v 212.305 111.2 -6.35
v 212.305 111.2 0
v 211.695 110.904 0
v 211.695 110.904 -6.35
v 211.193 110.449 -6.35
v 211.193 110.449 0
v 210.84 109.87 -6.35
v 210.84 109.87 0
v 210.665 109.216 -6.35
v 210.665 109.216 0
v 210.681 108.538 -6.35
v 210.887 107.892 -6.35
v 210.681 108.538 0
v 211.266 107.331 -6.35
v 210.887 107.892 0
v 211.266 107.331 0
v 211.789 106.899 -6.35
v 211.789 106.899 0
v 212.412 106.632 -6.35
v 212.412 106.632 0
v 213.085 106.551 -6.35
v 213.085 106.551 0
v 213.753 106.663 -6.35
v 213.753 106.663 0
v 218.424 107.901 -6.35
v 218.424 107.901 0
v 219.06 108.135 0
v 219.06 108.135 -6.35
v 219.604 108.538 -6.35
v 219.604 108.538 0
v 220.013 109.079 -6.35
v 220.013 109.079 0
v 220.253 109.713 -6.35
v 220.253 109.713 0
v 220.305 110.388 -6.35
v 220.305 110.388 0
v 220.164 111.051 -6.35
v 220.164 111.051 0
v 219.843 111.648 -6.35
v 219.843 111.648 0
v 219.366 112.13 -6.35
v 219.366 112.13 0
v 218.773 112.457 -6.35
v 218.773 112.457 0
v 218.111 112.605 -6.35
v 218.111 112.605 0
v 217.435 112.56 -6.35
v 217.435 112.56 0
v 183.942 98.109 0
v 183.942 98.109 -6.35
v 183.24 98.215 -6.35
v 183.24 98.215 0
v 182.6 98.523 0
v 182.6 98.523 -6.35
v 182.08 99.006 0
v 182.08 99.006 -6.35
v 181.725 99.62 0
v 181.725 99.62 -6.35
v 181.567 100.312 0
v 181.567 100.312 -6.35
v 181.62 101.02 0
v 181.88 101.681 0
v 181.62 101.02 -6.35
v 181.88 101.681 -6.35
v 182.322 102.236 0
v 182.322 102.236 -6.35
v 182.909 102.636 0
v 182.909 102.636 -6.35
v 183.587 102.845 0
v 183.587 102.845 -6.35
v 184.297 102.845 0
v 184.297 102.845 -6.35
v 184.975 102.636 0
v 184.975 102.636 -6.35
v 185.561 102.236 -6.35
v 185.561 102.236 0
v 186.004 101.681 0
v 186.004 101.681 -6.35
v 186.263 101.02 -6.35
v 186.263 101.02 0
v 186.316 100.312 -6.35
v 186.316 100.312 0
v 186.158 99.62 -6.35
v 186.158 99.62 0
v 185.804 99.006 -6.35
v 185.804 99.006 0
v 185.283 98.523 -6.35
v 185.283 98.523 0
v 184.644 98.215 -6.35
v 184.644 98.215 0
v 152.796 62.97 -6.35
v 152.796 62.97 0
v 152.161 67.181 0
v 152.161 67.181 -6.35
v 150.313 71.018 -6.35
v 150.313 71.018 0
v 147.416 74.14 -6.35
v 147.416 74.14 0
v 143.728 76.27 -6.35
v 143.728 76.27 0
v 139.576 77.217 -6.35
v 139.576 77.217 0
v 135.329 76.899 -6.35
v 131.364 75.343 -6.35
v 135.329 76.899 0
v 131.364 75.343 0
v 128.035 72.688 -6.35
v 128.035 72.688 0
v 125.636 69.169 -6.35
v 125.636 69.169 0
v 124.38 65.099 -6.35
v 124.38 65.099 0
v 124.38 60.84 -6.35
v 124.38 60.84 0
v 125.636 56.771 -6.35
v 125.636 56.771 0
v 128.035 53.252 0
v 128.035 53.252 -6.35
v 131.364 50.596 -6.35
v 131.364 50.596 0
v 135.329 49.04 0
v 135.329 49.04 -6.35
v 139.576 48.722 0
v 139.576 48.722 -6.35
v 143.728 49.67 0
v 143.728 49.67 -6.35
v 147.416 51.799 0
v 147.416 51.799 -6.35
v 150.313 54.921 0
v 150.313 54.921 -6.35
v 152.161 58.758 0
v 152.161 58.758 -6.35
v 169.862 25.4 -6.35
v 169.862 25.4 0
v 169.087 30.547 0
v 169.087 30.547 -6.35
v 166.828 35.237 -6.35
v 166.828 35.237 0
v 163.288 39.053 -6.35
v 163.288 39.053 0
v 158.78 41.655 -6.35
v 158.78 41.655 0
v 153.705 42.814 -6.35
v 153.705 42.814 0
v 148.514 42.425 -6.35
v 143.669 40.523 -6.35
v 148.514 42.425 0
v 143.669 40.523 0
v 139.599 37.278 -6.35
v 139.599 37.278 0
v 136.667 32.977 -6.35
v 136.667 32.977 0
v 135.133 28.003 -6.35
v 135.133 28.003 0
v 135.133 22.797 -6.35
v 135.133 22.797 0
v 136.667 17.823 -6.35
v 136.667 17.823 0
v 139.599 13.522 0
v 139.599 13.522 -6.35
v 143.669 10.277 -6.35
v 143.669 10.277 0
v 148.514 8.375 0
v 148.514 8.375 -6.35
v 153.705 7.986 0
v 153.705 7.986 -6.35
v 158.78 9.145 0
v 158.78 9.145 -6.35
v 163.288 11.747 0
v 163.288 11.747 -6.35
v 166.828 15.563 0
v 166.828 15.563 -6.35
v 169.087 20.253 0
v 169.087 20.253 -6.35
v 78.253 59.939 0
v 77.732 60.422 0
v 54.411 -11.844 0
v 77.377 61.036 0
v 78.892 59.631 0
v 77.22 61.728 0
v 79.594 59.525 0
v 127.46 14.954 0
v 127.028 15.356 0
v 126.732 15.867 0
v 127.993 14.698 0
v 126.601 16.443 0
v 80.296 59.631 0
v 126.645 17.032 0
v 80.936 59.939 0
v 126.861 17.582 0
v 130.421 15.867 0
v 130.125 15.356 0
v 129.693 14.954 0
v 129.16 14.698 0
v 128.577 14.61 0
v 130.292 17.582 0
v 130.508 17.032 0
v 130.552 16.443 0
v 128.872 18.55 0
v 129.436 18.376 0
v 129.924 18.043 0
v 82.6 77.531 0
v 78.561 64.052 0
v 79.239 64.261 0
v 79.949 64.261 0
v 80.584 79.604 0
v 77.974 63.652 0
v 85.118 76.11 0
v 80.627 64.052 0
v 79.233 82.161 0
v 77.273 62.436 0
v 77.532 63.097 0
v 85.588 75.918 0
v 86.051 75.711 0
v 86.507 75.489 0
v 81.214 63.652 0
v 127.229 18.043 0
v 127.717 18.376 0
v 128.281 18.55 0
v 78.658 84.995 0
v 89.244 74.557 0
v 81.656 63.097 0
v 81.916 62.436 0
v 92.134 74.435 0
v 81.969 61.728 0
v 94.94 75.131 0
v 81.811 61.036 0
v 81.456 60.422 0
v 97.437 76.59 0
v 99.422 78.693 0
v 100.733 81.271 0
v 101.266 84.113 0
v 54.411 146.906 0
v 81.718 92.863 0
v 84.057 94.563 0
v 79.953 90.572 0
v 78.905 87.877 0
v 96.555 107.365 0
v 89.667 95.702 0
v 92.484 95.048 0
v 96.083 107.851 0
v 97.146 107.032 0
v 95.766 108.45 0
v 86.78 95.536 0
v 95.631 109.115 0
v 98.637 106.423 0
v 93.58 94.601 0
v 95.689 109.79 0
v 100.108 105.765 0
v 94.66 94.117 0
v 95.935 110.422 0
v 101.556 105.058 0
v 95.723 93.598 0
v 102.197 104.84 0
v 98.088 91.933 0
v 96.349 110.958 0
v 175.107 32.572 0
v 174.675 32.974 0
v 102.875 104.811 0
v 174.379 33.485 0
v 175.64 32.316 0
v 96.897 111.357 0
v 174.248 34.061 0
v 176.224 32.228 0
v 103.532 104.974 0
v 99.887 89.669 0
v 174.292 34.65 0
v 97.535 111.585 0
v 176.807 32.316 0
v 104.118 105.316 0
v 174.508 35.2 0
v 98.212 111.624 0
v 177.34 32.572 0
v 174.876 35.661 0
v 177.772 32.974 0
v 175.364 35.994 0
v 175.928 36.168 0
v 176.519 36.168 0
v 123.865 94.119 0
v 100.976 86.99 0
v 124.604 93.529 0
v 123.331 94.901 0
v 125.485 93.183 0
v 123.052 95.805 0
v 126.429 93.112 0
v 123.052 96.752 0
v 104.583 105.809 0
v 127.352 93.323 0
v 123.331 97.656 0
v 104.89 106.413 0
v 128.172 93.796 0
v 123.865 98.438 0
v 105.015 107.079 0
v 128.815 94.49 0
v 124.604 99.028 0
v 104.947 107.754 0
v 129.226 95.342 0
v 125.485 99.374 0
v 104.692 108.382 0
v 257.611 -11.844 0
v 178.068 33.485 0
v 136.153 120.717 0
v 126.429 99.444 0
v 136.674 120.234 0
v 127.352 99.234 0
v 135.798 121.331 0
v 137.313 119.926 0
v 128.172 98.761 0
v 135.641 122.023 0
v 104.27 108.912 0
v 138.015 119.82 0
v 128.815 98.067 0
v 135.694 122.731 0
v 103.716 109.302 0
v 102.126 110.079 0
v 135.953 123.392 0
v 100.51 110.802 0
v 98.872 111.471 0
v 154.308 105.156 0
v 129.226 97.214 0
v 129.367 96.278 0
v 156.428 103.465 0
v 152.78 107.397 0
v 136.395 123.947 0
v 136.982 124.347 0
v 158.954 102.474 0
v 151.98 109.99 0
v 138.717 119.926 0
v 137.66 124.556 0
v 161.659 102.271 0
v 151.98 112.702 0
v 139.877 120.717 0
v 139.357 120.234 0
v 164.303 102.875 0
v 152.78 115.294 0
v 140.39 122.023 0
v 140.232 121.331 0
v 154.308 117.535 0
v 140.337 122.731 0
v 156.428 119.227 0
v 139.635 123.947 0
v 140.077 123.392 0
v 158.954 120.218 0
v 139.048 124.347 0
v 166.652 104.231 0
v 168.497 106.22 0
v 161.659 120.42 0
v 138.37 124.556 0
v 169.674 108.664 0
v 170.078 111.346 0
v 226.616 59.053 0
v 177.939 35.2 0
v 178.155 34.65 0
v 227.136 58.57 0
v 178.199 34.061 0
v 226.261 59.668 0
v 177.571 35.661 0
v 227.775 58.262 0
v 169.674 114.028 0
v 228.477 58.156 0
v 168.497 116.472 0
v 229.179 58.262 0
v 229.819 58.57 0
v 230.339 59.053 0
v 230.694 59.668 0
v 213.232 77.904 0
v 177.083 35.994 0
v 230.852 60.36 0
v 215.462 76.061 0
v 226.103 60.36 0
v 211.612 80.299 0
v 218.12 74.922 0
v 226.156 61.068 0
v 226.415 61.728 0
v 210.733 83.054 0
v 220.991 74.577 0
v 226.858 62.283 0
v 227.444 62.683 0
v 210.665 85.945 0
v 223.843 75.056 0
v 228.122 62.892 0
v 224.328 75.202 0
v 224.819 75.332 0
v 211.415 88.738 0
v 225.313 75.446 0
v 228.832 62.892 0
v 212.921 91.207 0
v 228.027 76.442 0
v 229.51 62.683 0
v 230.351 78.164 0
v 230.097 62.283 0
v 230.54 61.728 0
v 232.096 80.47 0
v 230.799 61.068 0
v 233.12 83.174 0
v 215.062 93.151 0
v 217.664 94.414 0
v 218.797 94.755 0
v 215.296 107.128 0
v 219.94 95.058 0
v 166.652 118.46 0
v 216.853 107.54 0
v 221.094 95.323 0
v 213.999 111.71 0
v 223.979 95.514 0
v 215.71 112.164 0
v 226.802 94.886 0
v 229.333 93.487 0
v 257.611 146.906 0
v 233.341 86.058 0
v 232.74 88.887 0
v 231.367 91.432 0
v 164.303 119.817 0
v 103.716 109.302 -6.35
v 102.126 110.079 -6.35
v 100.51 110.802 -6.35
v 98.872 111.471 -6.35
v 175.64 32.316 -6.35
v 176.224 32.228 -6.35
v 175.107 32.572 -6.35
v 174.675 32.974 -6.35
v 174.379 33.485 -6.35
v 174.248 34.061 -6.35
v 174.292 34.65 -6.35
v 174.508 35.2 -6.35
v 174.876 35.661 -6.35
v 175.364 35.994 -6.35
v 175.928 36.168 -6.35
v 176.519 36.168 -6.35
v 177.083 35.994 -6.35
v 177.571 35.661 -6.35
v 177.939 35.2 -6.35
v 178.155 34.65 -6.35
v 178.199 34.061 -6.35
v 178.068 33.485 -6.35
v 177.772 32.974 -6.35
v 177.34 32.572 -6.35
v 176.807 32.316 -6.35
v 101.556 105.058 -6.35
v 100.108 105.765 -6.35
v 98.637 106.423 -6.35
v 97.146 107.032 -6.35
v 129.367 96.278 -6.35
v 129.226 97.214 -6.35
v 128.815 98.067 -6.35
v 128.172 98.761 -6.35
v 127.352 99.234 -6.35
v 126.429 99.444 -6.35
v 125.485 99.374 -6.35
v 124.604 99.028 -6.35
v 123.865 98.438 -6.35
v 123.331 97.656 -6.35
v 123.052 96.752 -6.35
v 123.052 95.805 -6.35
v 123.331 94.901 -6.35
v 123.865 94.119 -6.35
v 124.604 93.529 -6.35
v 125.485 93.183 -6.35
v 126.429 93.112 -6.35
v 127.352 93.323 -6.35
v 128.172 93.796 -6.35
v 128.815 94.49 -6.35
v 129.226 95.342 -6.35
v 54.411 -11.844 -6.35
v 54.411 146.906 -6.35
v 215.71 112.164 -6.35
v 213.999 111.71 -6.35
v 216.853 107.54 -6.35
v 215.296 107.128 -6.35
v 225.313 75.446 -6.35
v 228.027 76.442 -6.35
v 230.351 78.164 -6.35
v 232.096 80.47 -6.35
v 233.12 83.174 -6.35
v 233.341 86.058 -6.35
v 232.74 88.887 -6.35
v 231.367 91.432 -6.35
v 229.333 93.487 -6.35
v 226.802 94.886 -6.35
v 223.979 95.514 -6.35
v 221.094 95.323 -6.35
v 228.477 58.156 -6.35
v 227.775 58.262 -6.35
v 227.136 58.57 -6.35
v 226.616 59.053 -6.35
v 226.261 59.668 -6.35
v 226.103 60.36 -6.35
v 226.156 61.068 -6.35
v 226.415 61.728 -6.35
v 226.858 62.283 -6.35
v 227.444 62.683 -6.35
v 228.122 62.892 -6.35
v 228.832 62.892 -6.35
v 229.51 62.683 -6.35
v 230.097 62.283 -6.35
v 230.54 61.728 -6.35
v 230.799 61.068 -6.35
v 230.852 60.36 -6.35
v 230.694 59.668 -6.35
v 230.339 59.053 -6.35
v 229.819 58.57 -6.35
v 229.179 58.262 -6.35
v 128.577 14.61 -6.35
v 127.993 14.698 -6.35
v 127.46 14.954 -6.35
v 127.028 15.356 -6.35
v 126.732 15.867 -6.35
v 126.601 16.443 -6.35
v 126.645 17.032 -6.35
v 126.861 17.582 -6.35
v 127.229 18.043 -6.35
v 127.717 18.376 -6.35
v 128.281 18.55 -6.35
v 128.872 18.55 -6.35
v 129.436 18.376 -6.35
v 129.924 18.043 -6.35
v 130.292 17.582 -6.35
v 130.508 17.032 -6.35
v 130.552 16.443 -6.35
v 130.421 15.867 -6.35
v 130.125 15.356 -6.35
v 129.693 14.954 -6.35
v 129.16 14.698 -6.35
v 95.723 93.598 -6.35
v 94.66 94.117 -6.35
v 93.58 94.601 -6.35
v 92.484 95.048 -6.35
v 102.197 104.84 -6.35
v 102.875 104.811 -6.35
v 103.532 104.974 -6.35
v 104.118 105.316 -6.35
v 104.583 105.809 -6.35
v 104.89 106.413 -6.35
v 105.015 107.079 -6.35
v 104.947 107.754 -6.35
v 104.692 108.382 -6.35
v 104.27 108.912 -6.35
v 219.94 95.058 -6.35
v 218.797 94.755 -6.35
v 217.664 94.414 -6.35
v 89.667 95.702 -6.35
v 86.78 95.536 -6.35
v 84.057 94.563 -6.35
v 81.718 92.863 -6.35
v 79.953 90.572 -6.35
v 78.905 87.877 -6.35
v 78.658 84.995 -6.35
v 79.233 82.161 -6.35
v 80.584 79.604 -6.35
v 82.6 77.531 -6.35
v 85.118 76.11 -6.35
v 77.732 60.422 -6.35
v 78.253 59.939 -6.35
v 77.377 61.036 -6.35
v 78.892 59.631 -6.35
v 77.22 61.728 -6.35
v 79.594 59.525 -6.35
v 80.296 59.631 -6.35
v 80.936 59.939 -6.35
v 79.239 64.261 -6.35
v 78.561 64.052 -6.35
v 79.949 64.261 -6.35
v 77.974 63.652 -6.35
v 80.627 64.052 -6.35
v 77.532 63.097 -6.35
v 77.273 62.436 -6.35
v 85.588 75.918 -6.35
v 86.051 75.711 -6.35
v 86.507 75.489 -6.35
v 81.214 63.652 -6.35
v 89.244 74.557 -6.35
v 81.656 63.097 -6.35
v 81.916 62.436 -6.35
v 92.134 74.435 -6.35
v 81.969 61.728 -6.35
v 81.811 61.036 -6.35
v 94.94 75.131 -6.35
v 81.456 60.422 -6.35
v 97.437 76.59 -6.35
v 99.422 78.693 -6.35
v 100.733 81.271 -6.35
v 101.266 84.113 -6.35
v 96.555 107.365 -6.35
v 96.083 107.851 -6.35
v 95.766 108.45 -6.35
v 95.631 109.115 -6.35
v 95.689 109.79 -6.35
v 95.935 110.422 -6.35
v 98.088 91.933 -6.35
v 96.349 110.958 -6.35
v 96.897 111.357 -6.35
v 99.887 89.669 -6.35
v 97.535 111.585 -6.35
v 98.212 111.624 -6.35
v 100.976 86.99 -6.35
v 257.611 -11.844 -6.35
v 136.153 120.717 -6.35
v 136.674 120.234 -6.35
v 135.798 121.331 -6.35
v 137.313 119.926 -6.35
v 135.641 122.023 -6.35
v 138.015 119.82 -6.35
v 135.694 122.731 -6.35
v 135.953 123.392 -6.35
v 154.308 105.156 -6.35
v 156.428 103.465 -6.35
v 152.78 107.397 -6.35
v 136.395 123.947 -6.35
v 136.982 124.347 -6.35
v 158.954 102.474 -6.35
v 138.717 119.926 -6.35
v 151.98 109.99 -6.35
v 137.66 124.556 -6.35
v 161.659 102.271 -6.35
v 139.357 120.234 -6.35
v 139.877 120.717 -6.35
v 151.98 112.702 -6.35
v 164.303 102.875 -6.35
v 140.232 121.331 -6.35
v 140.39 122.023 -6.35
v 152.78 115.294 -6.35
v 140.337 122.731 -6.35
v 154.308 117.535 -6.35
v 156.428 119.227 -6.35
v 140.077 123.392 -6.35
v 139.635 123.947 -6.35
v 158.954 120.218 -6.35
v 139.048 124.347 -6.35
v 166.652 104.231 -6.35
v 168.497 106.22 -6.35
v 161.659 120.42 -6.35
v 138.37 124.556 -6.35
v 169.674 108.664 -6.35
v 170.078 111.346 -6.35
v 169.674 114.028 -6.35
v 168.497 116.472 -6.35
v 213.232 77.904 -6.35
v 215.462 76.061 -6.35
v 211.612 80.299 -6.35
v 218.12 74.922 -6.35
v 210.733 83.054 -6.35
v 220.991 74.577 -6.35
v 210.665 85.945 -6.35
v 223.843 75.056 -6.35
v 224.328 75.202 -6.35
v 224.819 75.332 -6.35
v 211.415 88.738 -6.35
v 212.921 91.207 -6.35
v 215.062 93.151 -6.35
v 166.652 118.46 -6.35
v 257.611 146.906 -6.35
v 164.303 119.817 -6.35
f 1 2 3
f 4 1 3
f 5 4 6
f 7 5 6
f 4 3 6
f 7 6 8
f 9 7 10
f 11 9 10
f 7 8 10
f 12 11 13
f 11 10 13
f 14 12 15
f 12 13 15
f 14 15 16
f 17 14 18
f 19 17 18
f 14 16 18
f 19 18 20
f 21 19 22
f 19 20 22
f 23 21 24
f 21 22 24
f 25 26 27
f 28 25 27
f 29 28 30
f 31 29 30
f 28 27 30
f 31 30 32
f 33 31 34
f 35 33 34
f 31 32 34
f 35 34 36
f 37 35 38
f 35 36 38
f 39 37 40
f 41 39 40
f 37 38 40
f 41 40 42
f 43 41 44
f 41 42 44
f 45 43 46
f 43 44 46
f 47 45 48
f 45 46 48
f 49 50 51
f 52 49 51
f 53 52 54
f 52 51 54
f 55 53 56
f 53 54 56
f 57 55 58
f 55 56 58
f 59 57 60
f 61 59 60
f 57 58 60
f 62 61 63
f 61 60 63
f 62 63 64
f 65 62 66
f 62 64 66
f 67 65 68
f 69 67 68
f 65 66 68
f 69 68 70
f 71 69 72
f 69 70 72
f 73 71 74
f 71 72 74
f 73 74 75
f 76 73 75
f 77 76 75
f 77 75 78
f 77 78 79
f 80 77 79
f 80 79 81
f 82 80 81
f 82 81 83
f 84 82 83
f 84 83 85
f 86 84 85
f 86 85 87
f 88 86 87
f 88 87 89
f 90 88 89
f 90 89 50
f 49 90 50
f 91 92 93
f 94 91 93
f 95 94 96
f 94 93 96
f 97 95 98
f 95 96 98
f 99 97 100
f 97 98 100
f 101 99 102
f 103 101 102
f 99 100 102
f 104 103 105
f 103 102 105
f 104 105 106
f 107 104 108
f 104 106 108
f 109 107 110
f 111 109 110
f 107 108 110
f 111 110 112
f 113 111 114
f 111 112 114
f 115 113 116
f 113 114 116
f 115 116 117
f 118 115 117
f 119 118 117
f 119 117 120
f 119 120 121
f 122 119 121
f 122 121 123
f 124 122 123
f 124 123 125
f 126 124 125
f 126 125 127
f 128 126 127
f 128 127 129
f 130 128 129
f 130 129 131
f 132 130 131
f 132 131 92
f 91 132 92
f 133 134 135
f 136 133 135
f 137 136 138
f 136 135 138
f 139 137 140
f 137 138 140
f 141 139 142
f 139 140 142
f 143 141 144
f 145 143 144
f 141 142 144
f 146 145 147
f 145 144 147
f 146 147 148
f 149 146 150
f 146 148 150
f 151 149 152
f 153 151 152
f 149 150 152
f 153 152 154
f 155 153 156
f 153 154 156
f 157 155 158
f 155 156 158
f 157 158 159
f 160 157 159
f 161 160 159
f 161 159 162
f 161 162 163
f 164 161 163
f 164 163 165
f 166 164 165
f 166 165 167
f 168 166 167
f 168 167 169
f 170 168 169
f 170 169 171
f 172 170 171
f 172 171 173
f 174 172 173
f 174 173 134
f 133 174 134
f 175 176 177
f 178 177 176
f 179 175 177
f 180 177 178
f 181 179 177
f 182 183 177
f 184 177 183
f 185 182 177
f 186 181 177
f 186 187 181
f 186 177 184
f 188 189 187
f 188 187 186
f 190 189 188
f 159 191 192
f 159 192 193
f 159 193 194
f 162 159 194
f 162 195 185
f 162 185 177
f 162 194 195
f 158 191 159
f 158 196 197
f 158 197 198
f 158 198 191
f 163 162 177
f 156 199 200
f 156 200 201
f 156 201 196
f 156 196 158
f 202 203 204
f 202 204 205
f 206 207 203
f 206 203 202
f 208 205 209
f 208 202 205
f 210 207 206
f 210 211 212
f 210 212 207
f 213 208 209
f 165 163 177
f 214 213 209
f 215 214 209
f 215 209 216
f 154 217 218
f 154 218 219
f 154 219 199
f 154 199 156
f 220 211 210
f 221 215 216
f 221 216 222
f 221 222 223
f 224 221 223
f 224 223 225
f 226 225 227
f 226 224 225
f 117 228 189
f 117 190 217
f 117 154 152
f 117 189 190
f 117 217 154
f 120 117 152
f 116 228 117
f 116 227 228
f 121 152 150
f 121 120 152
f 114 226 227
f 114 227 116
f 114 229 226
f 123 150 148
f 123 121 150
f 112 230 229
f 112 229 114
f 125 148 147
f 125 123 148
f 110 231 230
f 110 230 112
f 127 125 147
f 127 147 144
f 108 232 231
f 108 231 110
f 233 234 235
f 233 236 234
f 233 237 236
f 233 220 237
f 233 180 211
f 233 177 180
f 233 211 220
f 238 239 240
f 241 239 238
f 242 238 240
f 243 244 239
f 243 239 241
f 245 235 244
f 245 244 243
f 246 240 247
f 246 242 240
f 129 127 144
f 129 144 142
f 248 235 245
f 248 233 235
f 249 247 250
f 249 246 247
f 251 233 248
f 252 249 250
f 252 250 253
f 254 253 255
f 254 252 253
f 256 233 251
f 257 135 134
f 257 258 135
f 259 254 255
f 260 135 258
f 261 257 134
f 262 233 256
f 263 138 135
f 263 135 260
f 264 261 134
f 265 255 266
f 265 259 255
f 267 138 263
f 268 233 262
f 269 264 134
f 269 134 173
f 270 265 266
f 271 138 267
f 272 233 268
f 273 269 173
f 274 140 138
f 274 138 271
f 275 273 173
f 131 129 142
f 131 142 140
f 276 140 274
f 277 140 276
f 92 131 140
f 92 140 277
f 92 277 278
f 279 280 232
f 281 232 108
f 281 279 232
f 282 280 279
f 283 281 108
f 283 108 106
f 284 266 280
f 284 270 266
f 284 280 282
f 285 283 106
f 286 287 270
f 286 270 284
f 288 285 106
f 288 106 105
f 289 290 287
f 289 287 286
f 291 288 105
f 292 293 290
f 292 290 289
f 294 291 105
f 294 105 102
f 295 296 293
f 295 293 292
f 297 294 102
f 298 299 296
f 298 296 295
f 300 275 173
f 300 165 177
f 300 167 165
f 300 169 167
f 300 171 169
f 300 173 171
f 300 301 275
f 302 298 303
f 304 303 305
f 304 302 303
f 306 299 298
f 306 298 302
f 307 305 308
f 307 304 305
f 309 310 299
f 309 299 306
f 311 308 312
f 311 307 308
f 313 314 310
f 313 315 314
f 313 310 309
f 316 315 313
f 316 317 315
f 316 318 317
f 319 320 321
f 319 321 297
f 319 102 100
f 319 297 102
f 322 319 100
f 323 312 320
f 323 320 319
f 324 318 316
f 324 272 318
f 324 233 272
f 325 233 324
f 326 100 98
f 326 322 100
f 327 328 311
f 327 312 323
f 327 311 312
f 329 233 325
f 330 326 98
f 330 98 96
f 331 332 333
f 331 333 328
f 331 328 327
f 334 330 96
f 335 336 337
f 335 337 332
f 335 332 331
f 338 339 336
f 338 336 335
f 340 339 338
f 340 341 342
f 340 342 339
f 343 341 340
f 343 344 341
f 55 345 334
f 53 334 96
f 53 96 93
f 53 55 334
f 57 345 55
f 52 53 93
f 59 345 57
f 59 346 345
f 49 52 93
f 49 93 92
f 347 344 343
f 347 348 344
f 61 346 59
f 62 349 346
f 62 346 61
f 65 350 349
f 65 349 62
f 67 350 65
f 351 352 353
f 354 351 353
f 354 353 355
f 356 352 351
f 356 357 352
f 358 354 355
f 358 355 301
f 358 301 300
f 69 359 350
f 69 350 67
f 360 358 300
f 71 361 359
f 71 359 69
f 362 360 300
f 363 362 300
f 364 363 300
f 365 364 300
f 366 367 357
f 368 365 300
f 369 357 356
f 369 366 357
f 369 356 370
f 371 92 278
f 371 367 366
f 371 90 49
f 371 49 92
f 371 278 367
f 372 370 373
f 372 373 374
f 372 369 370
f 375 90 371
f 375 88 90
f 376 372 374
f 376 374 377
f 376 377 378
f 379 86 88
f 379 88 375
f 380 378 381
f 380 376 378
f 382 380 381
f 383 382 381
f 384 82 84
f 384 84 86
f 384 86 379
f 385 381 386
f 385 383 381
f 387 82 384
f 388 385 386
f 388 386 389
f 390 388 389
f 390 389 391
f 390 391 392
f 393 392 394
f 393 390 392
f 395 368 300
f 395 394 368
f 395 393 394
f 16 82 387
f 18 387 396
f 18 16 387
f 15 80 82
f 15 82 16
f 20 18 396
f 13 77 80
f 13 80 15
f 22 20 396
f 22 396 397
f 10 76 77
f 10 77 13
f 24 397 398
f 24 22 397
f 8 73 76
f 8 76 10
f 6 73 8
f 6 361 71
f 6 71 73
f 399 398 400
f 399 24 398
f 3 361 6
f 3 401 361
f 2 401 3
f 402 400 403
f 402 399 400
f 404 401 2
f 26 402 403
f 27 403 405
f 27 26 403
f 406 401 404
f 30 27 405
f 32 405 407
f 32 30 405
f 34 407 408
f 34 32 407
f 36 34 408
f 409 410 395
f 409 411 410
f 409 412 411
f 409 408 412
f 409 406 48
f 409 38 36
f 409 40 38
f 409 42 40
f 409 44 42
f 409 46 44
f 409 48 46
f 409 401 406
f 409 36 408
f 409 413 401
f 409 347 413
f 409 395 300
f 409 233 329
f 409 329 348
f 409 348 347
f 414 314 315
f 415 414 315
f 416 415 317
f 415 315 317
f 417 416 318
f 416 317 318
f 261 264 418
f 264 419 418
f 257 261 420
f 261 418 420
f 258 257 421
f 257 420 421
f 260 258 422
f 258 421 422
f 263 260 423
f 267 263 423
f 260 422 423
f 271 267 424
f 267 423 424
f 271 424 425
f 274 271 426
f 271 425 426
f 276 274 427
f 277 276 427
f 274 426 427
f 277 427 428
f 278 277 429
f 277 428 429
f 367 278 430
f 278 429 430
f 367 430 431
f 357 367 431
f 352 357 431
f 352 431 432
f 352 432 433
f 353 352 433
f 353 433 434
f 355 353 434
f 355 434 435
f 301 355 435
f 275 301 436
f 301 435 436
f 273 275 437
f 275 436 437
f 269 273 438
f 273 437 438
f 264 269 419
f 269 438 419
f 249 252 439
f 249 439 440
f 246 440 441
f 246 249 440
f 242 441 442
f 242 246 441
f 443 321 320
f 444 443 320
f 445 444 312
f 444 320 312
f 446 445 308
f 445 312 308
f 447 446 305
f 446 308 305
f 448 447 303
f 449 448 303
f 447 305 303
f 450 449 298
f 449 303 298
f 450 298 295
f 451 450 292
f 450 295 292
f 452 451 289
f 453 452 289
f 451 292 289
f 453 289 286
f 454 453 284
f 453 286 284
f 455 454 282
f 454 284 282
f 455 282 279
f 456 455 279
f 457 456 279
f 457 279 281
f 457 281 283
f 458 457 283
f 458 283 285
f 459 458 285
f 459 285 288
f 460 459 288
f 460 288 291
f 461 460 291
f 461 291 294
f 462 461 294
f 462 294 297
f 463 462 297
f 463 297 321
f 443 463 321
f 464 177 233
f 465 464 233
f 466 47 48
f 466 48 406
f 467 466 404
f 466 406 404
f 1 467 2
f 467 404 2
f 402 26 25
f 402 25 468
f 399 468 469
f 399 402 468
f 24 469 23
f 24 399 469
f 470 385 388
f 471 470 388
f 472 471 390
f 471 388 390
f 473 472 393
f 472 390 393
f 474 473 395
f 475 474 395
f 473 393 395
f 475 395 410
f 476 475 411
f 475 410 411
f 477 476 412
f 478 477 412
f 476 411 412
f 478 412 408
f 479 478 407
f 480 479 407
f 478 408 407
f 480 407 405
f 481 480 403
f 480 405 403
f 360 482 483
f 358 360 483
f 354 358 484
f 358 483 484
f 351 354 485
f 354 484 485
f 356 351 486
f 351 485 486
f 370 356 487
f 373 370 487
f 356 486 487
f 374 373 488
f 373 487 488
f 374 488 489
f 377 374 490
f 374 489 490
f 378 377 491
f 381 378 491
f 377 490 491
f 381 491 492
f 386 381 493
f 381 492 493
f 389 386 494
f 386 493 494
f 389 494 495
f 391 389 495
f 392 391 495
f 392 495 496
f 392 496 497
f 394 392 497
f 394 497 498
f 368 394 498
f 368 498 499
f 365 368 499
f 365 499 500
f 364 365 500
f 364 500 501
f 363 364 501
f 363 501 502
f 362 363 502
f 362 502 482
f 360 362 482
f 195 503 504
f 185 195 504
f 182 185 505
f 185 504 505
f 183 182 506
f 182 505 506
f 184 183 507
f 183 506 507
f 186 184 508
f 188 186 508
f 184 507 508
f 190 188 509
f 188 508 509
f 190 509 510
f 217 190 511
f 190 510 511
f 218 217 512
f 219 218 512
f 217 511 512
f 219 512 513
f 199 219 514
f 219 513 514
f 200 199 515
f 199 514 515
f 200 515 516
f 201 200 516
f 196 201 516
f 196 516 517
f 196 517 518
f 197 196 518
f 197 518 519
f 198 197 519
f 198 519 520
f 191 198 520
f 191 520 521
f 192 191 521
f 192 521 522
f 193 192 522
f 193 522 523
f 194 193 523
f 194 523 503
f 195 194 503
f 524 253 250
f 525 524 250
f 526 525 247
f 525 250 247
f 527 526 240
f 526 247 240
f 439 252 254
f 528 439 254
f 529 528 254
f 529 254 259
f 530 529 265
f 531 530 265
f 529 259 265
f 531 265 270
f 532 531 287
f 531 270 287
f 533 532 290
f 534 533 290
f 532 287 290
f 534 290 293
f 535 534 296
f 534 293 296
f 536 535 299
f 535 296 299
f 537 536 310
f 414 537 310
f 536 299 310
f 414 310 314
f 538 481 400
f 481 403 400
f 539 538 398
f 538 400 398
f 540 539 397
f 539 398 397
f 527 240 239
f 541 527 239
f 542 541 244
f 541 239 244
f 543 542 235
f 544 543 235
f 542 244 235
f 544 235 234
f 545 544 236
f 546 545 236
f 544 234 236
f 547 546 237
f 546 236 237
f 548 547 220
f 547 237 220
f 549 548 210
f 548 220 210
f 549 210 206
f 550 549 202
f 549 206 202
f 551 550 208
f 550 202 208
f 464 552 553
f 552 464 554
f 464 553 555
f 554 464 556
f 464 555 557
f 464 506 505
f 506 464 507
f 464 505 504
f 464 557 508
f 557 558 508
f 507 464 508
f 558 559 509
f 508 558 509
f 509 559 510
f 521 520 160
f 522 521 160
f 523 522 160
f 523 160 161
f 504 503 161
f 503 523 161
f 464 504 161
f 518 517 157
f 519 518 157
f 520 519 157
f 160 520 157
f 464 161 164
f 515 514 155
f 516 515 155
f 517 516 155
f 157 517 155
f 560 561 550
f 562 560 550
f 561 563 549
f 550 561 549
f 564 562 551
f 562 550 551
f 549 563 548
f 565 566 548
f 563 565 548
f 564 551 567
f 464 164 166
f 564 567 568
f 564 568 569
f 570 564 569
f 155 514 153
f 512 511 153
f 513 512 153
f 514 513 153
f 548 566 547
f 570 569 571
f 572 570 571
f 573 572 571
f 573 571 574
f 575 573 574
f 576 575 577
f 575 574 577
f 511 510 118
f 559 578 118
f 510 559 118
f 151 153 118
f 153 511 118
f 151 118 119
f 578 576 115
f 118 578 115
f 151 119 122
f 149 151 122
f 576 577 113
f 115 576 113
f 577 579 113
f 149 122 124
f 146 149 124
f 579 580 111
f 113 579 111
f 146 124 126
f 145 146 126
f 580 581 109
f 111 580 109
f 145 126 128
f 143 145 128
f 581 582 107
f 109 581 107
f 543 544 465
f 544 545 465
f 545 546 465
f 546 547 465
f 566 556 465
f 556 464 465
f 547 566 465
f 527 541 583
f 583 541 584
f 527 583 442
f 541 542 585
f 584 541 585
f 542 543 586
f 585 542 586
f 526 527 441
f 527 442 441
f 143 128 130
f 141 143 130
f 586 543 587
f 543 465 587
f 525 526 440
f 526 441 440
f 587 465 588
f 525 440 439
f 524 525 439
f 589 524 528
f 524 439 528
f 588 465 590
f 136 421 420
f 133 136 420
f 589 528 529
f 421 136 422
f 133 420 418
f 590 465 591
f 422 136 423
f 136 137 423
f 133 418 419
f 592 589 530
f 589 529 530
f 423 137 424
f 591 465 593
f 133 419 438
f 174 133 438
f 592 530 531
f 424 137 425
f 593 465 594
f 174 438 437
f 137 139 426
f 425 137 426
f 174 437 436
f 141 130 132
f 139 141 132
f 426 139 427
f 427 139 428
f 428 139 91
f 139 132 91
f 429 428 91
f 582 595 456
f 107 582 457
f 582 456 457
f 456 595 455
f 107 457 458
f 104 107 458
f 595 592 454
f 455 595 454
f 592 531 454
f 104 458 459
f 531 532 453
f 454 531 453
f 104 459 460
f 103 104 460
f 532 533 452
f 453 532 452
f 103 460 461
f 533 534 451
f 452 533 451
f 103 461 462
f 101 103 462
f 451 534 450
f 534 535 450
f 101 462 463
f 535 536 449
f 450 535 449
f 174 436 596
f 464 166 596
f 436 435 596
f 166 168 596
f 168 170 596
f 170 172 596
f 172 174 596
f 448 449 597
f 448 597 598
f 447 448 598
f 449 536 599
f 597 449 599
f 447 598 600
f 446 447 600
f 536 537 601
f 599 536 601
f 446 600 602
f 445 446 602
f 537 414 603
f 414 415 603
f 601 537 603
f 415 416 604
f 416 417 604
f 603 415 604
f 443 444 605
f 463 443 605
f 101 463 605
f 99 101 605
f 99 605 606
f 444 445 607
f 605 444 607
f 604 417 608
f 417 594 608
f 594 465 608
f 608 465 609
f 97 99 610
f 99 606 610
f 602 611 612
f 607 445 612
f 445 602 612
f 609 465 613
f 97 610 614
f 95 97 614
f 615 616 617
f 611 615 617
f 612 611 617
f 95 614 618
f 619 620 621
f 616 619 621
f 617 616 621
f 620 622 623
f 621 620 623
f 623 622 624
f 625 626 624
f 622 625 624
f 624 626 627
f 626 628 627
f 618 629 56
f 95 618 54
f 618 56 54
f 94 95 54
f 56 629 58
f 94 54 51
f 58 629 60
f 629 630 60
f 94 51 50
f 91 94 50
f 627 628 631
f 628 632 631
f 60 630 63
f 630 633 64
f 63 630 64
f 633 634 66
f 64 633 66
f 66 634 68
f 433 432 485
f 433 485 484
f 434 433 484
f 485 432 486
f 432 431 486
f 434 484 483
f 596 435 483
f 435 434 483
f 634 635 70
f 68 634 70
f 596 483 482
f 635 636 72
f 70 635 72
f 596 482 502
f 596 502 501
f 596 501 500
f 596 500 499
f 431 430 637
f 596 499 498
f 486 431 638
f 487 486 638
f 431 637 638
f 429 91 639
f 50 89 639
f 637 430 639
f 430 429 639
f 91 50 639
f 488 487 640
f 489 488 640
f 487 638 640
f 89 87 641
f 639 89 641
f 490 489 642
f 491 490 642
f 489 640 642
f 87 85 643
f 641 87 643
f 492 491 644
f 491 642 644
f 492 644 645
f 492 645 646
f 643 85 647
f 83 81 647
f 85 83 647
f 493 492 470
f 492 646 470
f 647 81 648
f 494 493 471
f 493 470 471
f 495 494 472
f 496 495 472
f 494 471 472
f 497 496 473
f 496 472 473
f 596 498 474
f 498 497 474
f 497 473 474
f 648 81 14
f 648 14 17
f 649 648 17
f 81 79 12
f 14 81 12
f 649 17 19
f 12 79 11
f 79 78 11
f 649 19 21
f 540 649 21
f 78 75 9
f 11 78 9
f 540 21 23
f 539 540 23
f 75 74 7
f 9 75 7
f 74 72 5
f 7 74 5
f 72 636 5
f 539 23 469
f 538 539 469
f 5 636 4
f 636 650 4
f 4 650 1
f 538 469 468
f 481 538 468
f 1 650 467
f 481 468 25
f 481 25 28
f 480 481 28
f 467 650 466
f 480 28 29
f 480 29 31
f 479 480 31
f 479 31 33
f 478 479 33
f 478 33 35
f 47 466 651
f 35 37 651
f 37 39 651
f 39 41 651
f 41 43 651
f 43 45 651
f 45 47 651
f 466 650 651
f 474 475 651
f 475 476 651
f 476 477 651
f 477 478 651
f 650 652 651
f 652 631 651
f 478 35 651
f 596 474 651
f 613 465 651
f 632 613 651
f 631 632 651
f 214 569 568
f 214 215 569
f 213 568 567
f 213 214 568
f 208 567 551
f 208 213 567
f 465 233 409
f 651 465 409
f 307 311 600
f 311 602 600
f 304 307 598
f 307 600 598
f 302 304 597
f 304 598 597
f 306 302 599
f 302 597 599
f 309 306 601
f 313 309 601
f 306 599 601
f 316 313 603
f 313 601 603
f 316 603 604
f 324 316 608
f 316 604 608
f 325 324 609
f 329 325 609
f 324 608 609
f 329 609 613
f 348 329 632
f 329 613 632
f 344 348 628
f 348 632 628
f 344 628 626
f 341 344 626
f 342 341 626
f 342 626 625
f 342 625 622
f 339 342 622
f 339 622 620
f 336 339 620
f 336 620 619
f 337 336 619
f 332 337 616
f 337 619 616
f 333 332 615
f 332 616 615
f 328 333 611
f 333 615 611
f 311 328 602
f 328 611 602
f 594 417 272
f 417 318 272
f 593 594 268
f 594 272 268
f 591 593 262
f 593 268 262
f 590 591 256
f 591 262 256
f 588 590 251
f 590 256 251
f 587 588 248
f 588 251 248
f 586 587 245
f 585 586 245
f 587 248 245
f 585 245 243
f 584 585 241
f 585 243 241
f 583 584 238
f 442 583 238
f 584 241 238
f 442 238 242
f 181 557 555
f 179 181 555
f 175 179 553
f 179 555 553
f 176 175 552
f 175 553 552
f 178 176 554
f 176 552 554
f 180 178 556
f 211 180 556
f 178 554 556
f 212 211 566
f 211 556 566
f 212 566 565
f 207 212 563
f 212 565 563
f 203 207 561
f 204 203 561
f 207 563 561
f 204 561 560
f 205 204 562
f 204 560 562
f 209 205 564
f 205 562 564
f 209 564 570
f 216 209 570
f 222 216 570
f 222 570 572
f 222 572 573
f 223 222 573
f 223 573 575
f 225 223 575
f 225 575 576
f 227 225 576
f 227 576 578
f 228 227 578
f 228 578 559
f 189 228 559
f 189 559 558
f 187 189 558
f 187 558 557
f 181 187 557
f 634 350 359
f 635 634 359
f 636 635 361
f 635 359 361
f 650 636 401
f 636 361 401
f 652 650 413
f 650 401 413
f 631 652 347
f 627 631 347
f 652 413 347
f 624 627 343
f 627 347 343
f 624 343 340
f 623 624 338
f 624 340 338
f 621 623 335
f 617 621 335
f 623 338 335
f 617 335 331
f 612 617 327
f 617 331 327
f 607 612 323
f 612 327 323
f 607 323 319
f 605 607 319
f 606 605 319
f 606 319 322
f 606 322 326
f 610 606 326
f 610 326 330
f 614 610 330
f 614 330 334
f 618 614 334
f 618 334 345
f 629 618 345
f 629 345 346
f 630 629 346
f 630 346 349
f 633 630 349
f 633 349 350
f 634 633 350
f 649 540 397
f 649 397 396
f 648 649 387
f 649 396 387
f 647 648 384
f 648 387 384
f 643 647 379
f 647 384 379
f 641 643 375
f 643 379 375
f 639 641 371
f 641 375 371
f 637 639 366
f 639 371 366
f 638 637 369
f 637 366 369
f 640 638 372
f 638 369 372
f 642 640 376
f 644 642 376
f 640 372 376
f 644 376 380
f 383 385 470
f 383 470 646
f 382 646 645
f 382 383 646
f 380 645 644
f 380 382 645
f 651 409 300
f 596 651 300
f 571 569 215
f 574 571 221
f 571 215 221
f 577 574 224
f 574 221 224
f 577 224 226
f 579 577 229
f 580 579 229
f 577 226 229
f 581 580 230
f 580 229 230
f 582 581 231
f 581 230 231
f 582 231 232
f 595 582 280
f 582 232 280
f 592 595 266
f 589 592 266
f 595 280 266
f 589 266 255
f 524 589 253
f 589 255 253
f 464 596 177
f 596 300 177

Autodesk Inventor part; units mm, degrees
ref_plane "YZ Plane" through (0, 0, 0) normal (1, 0, 0) x (0, 1, 0)
ref_plane "XZ Plane" through (0, 0, 0) normal (0, 1, 0) x (-1, 0, 0)
ref_plane "XY Plane" through (0, 0, 0) normal (0, 0, 1) x (1, 0, 0)
sketch "Sketch1" plane through (0, 0, 0) normal (0, 0, 1) x (1, 0, 0)
  line L0 (0, 0) -> (304.8, 0) construction
  line L1 (304.8, 0) -> (304.8, 50.8) construction
  line L2 (304.8, 50.8) -> (0, 50.8) construction
  line L3 (0, 50.8) -> (0, 0) construction
  circle A0 centre (152.4, 25.4) radius 17.4625
  circle A1 centre (152.4, 25.4) radius 30.48 construction
  circle A2 centre (152.4, 25.4) radius 22.225 construction
  line L4 (152.4, 25.4) -> (138.5082, 62.9697) construction
  circle A3 centre (138.5082, 62.9697) radius 9.525 construction
  circle A4 centre (138.5082, 62.9697) radius 17.78 construction
  circle A5 centre (89.9711, 85.09) radius 31.75 construction
  circle A6 centre (160.9785, 111.3458) radius 31.75 construction
  circle A7 centre (221.9701, 85.09) radius 31.75 construction
  line L5 (0, 50.8) -> (0, 53.34) construction
  line L6 (0, 53.34) -> (304.8, 53.34) construction
  line L7 (304.8, 53.34) -> (304.8, 50.8) construction
  circle A8 centre (138.5082, 62.9697) radius 21.59 construction
  circle A9 centre (152.4, 25.4) radius 46.99 construction
  circle A10 centre (152.4, 25.4) radius 50.8 construction
  arc A11 (84.9408, 79.3264) -> (90.9184, 92.6811) centre (89.9711, 85.09) ccw construction
  circle A12 centre (160.9785, 111.3458) radius 7.65 construction
  arc A13 (221.6946, 92.735) -> (225.5172, 78.312) centre (221.9701, 85.09) ccw construction
  circle A14 centre (160.9785, 111.3458) radius 9.1
  circle A15 centre (138.5082, 62.9697) radius 22.9 construction
  line L8 (84.9408, 79.3264) -> (123.4503, 45.7166) construction
  line L9 (168.5483, 110.2412) -> (161.1682, 59.6633) construction
  line L10 (90.9184, 92.6811) -> (89.9711, 85.09) construction
  line L11 (89.9711, 85.09) -> (84.9408, 79.3264) construction
  circle A16 centre (126.192, 96.2783) radius 3.175
  circle A17 centre (126.192, 96.2783) radius 7.9375 construction
  line L12 (90.9184, 92.6811) -> (125.2091, 88.4019) construction
  line L13 (132.0626, 90.936) -> (155.3205, 116.4945) construction
  line L14 (155.3205, 116.4945) -> (160.9785, 111.3458) construction
  line L15 (168.5483, 110.2412) -> (160.9785, 111.3458) construction
  line L16 (138.5082, 62.9697) -> (126.192, 96.2783) construction
  line L17 (89.9711, 85.09) -> (160.9785, 111.3458) construction
  line L18 (152.4, 25.4) -> (89.9711, 85.09) construction
  line L19 (152.4, 25.4) -> (160.9785, 111.3458) construction
  circle A18 centre (126.192, 96.2783) radius 9.2075 construction
  circle A19 centre (126.192, 96.2783) radius 6.1595 construction
  arc A20 (90.9184, 92.6811) -> (84.9408, 79.3264) centre (89.9711, 85.09) ccw construction
  circle A21 centre (160.9785, 111.3458) radius 25.4 construction
  circle A22 centre (221.9701, 85.09) radius 25.4 construction
  line L20 (102.9424, 114.0695) -> (76.9998, 56.1105) construction
  circle A23 centre (89.9711, 85.09) radius 25.4 construction
  line L21 (213.8361, 115.7804) -> (230.1041, 54.3996) construction
  line L22 (54.4111, 146.9058) -> (257.6111, 146.9058)
  line L23 (257.6111, 146.9058) -> (257.6111, -11.8442)
  line L24 (257.6111, -11.8442) -> (54.4111, -11.8442)
  line L25 (54.4111, -11.8442) -> (54.4111, 146.9058)
  circle A24 centre (138.5082, 62.9697) radius 14.2875
  arc A25 (225.3129, 75.4455) -> (221.0936, 95.3227) centre (223.2033, 85.3841) ccw
  line L26 (220.7531, 84.7347) -> (228.4773, 60.5377) construction
  line L27 (223.2033, 85.3841) -> (228.4773, 60.5377) construction
  line L28 (220.7531, 84.7347) -> (213.029, 108.9318) construction
  line L29 (223.2033, 85.3841) -> (217.9292, 110.2305) construction
  arc A26 (212.3049, 111.2003) -> (213.7531, 106.6633) centre (213.029, 108.9318) ccw
  arc A27 (218.4237, 107.9012) -> (217.4348, 112.5599) centre (217.9292, 110.2305) ccw
  arc A28 (218.4237, 107.9012) -> (213.7531, 106.6633) centre (228.4773, 60.5377) ccw
  arc A29 (217.4348, 112.5599) -> (212.3049, 111.2003) centre (228.4773, 60.5377) ccw
  line L30 (213.029, 108.9318) -> (212.3049, 111.2003) construction
  line L31 (217.9292, 110.2305) -> (217.4348, 112.5599) construction
  arc A30 (221.0936, 95.3227) -> (217.6635, 94.4136) centre (228.4773, 60.5377) ccw
  arc A31 (225.3129, 75.4455) -> (223.8428, 75.0559) centre (228.4773, 60.5377) ccw
  line L32 (102.6358, 107.1803) -> (91.1149, 84.5434) construction
  line L33 (79.5941, 61.9064) -> (88.8014, 85.5789) construction
  arc A32 (98.8719, 111.4706) -> (97.1455, 107.0321) centre (98.0087, 109.2513) ccw
  arc A33 (101.5557, 105.0581) -> (103.7158, 109.3025) centre (102.6358, 107.1803) ccw
  arc A34 (101.5557, 105.0581) -> (97.1455, 107.0321) centre (79.5941, 61.9064) ccw
  line L34 (98.0087, 109.2513) -> (98.8719, 111.4706) construction
  line L35 (102.6358, 107.1803) -> (103.7158, 109.3025) construction
  arc A35 (103.7158, 109.3025) -> (98.8719, 111.4706) centre (79.5941, 61.9064) ccw
  arc A36 (217.6635, 94.4136) -> (223.8428, 75.0559) centre (220.7531, 84.7347) ccw
  arc A37 (86.5066, 75.4886) -> (95.7233, 93.5981) centre (91.1149, 84.5434) ccw
  line L36 (88.8014, 85.5789) -> (98.0087, 109.2513) construction
  line L37 (91.1149, 84.5434) -> (79.5941, 61.9064) construction
  arc A38 (86.5066, 75.4886) -> (85.1185, 76.1099) centre (79.5941, 61.9064) ccw
  arc A39 (95.7233, 93.5981) -> (92.4843, 95.0479) centre (79.5941, 61.9064) ccw
  arc A40 (92.4843, 95.0479) -> (85.1185, 76.1099) centre (88.8014, 85.5789) ccw
  line L38 (160.9785, 111.3458) -> (138.0151, 122.2014) construction
  line L39 (160.9785, 111.3458) -> (183.9418, 100.4902) construction
  circle A41 centre (138.5082, 62.9697) radius 26.75 construction
  line L40 (221.6946, 92.735) -> (137.5448, 89.7024) construction
  line L41 (225.5172, 78.312) -> (150.9113, 39.269) construction
  line L42 (221.9701, 85.09) -> (221.6946, 92.735) construction
  line L43 (221.9701, 85.09) -> (225.5172, 78.312) construction
  line L44 (138.5082, 62.9697) -> (137.5448, 89.7024) construction
  line L45 (138.5082, 62.9697) -> (150.9113, 39.269) construction
  arc A42 (225.5172, 78.312) -> (221.6946, 92.735) centre (221.9701, 85.09) ccw construction
  arc A43 (225.5172, 78.312) -> (224.7763, 77.9733) centre (221.9701, 85.09) ccw construction
  line L46 (138.5082, 62.9697) -> (221.9701, 85.09) construction
  line L47 (152.4, 25.4) -> (176.2235, 34.209) construction
  line L48 (152.4, 25.4) -> (128.5765, 16.591) construction
  point P0 (215.4629, 109.6423)
  point P1 (100.3481, 108.2736)
  dimension "d1" = 50.8
  dimension "d2" = 34.925
  dimension "d3" = 25.4
  dimension "d4" = 152.4
  dimension "d7" = 60.96
  dimension "d8" = 44.45
  dimension "d9" = 19.05
  dimension "d10" = 35.56
  dimension "d11" = 40.0558
  dimension "d12" = 63.5
  dimension "d13" = 63.5
  dimension "d14" = 63.5
  dimension "d15" = 2.54
  dimension "d16" = 304.8
  dimension "d17" = 43.18
  dimension "d18" = 93.98
  dimension "d19" = 101.6
  dimension "d21" = 15.3
  dimension "d22" = 15.3
  dimension "d24" = 18.2
  dimension "d29" = 45.8
  dimension "d30" = 146
  dimension "d31" = 6.35
  dimension "d32" = 15.875
  dimension "d33" = 146
  dimension "d35" = 18.415
  dimension "d37" = 12.319
  dimension "d40" = 50.8
  dimension "d41" = 50.8
  dimension "d42" = 17
  dimension "d43" = 17
  dimension "d44" = 50.8
  dimension "d53" = 203.2
  dimension "d54" = 158.75
  dimension "d55" = 35.56
  dimension "d56" = 35.56
  dimension "d57" = 28.575
  dimension "d67" = 25.4
  dimension "d68" = 25.4
  dimension "d69" = 2.86
  dimension "d70" = 25.4
  dimension "d71" = 25.4
  dimension "d72" = 4.7625
  dimension "d75" = 2.86
  dimension "d80" = 4.7625
  dimension "d82" = 4.7625
  dimension "d83" = 50.8
  dimension "d84" = 50.8
  dimension "d85" = 10.16
  dimension "d97" = 48.4188
  dimension "d99" = 20.32
  dimension "d101" = 25.4
  dimension "d102" = 25.4
  dimension "d103" = 10.16
  dimension "d105" = 17
  dimension "d106" = 17
  dimension "d107" = 53.5
  dimension "d108" = 154.44
  dimension "d109" = 7.65
  dimension "d111" = 86.3435
  dimension "d112" = 12.78
  dimension "d113" = 12.78
  dimension "d123" = 25.4
  dimension "d124" = 25.4
extrude "Extrusion3" add sketch "Sketch1" against normal blind 6.35
hole "Hole3" at (79.5941, 61.9064, 0) at (228.4773, 60.5377, 0) at (183.9418, 100.4902, 0) at (138.0151, 122.2014, 0) direction (0, 0, -1) diameter 4.7625 end through all
hole "Hole4" at (128.5765, 16.591, 0) at (176.2235, 34.209, 0) direction (0, 0, -1) diameter 3.9624 end through all thread size "10-32 UNF" class "2B" standard "ANSI Unified Screw Threads"
equation "\"d7\" = Gear48tPD"
equation "\"d8\" = Gear35tPD"
equation "\"d9\" = Gear15tPD"
equation "\"d10\" = Gear28tPD"
equation "\"d11\" = 0.5 * Gear48tPD + 0.5 * Gear15tPD + MeshingClearance"
equation "\"d12\" = CimOD"
equation "\"d13\" = CimOD"
equation "\"d14\" = CimOD"
equation "\"d17\" = Gear28tPD + ClearanceDiameter"
equation "\"d18\" = WheelOD"
equation "\"d19\" = WheelClearance"
equation "\"Pulley48tPD\" = 45.8"
equation "\"Pulley19tPD\" = 18.2"
equation "\"Pulley16tPD\" = 15.3"
equation "\"Gear15tPD\" = 19.05"
equation "\"Gear35tPD\" = 44.45"
equation "\"Gear48tPD\" = 60.96"
equation "\"Gear28tPD\" = 35.56"
equation "\"BearingLargeOD\" = 28.575"
equation "\"BearingSmallOD\" = 22.225"
equation "\"MeshingClearance\" = 0.0508"
equation "\"CimOD\" = 63.5"
equation "\"WheelOD\" = 93.98"
equation "\"ClearanceDiameter\" = 7.62"
equation "\"WheelClearance\" = 101.6"
equation "\"TensioningBearingID\" = 6.35"
equation "\"TensioningBearingOD\" = 15.875"
equation "\"SpingClipClearance\" = 8.89"
equation "\"Pi\" = 79.79645"
equation "\"Pulley56tPD\" = 53.5"
equation "\"BearingXLargeOD\" = 34.925"
properties part number "OutlineSketch1" material "Aluminum 6061"
